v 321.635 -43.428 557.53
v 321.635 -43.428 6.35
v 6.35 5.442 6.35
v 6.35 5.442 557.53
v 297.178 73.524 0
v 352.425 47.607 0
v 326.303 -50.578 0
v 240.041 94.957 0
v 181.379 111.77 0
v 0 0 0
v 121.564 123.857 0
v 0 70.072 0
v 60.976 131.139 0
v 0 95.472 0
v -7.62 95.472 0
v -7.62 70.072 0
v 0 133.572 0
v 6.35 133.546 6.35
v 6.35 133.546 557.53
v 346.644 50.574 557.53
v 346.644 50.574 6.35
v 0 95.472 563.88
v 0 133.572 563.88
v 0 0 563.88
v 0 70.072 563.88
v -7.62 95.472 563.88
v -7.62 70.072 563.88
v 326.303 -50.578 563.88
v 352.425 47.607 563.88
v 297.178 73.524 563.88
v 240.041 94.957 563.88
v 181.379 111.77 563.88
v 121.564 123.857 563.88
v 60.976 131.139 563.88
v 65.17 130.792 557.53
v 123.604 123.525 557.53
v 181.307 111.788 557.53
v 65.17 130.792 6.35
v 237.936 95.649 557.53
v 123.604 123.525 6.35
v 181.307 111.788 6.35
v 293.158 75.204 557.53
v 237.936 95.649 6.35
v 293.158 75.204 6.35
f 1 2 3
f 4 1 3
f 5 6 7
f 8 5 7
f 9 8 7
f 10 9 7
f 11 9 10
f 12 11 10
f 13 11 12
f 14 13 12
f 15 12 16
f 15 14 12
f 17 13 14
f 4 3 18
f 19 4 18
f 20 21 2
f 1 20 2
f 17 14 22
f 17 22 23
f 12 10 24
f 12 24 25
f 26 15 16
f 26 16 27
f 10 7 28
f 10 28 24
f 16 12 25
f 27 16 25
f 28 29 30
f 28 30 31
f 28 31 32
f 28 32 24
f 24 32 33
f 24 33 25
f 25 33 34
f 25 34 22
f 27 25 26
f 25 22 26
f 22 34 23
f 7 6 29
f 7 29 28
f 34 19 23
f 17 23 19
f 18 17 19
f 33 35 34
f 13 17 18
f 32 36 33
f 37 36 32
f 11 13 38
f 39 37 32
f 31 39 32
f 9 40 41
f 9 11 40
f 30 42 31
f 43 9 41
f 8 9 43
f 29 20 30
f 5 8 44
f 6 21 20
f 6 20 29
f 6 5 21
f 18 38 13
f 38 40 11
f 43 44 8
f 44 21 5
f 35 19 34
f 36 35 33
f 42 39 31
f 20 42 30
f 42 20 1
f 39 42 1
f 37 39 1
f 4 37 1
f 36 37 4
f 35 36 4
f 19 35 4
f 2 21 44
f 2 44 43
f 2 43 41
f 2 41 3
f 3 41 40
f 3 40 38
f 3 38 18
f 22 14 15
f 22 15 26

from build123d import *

# Parameters (mm, degrees)
BOSS_EXTRUDE1_DEPTH = 563.88
SHELL1_T            = -6.35
SKETCH2_W           = 563.88
SKETCH2_H           = 25.4
BOSS_EXTRUDE2_DEPTH = 7.62


with BuildPart() as part:
    # Sketch1 → Boss-Extrude1 (new body)
    with BuildSketch(Plane.XY):
        with BuildLine():
            Line((0, 0), (0, 133.572018751))
            ThreePointArc((0, 133.572018751), (181.379040374, 111.770166328), (352.425, 47.606650594))
            Line((352.425, 47.606650594), (326.303398408, -50.577981249))
            Line((326.303398408, -50.577981249), (0, 0))
        make_face()
    extrude(amount=BOSS_EXTRUDE1_DEPTH)

    # Shell1
    shell1_openings = [part.faces().sort_by_distance(p)[0] for p in [
        (181.379040374, 111.770166328, 281.94),
    ]]
    offset(amount=SHELL1_T, openings=shell1_openings, kind=Kind.INTERSECTION)

    # Sketch2 → Boss-Extrude2 (add)
    with BuildSketch(Plane.ZY):
        with Locations((281.94, 82.772018751)):
            Rectangle(SKETCH2_W, SKETCH2_H)
    extrude(amount=BOSS_EXTRUDE2_DEPTH)


solid = part.part
